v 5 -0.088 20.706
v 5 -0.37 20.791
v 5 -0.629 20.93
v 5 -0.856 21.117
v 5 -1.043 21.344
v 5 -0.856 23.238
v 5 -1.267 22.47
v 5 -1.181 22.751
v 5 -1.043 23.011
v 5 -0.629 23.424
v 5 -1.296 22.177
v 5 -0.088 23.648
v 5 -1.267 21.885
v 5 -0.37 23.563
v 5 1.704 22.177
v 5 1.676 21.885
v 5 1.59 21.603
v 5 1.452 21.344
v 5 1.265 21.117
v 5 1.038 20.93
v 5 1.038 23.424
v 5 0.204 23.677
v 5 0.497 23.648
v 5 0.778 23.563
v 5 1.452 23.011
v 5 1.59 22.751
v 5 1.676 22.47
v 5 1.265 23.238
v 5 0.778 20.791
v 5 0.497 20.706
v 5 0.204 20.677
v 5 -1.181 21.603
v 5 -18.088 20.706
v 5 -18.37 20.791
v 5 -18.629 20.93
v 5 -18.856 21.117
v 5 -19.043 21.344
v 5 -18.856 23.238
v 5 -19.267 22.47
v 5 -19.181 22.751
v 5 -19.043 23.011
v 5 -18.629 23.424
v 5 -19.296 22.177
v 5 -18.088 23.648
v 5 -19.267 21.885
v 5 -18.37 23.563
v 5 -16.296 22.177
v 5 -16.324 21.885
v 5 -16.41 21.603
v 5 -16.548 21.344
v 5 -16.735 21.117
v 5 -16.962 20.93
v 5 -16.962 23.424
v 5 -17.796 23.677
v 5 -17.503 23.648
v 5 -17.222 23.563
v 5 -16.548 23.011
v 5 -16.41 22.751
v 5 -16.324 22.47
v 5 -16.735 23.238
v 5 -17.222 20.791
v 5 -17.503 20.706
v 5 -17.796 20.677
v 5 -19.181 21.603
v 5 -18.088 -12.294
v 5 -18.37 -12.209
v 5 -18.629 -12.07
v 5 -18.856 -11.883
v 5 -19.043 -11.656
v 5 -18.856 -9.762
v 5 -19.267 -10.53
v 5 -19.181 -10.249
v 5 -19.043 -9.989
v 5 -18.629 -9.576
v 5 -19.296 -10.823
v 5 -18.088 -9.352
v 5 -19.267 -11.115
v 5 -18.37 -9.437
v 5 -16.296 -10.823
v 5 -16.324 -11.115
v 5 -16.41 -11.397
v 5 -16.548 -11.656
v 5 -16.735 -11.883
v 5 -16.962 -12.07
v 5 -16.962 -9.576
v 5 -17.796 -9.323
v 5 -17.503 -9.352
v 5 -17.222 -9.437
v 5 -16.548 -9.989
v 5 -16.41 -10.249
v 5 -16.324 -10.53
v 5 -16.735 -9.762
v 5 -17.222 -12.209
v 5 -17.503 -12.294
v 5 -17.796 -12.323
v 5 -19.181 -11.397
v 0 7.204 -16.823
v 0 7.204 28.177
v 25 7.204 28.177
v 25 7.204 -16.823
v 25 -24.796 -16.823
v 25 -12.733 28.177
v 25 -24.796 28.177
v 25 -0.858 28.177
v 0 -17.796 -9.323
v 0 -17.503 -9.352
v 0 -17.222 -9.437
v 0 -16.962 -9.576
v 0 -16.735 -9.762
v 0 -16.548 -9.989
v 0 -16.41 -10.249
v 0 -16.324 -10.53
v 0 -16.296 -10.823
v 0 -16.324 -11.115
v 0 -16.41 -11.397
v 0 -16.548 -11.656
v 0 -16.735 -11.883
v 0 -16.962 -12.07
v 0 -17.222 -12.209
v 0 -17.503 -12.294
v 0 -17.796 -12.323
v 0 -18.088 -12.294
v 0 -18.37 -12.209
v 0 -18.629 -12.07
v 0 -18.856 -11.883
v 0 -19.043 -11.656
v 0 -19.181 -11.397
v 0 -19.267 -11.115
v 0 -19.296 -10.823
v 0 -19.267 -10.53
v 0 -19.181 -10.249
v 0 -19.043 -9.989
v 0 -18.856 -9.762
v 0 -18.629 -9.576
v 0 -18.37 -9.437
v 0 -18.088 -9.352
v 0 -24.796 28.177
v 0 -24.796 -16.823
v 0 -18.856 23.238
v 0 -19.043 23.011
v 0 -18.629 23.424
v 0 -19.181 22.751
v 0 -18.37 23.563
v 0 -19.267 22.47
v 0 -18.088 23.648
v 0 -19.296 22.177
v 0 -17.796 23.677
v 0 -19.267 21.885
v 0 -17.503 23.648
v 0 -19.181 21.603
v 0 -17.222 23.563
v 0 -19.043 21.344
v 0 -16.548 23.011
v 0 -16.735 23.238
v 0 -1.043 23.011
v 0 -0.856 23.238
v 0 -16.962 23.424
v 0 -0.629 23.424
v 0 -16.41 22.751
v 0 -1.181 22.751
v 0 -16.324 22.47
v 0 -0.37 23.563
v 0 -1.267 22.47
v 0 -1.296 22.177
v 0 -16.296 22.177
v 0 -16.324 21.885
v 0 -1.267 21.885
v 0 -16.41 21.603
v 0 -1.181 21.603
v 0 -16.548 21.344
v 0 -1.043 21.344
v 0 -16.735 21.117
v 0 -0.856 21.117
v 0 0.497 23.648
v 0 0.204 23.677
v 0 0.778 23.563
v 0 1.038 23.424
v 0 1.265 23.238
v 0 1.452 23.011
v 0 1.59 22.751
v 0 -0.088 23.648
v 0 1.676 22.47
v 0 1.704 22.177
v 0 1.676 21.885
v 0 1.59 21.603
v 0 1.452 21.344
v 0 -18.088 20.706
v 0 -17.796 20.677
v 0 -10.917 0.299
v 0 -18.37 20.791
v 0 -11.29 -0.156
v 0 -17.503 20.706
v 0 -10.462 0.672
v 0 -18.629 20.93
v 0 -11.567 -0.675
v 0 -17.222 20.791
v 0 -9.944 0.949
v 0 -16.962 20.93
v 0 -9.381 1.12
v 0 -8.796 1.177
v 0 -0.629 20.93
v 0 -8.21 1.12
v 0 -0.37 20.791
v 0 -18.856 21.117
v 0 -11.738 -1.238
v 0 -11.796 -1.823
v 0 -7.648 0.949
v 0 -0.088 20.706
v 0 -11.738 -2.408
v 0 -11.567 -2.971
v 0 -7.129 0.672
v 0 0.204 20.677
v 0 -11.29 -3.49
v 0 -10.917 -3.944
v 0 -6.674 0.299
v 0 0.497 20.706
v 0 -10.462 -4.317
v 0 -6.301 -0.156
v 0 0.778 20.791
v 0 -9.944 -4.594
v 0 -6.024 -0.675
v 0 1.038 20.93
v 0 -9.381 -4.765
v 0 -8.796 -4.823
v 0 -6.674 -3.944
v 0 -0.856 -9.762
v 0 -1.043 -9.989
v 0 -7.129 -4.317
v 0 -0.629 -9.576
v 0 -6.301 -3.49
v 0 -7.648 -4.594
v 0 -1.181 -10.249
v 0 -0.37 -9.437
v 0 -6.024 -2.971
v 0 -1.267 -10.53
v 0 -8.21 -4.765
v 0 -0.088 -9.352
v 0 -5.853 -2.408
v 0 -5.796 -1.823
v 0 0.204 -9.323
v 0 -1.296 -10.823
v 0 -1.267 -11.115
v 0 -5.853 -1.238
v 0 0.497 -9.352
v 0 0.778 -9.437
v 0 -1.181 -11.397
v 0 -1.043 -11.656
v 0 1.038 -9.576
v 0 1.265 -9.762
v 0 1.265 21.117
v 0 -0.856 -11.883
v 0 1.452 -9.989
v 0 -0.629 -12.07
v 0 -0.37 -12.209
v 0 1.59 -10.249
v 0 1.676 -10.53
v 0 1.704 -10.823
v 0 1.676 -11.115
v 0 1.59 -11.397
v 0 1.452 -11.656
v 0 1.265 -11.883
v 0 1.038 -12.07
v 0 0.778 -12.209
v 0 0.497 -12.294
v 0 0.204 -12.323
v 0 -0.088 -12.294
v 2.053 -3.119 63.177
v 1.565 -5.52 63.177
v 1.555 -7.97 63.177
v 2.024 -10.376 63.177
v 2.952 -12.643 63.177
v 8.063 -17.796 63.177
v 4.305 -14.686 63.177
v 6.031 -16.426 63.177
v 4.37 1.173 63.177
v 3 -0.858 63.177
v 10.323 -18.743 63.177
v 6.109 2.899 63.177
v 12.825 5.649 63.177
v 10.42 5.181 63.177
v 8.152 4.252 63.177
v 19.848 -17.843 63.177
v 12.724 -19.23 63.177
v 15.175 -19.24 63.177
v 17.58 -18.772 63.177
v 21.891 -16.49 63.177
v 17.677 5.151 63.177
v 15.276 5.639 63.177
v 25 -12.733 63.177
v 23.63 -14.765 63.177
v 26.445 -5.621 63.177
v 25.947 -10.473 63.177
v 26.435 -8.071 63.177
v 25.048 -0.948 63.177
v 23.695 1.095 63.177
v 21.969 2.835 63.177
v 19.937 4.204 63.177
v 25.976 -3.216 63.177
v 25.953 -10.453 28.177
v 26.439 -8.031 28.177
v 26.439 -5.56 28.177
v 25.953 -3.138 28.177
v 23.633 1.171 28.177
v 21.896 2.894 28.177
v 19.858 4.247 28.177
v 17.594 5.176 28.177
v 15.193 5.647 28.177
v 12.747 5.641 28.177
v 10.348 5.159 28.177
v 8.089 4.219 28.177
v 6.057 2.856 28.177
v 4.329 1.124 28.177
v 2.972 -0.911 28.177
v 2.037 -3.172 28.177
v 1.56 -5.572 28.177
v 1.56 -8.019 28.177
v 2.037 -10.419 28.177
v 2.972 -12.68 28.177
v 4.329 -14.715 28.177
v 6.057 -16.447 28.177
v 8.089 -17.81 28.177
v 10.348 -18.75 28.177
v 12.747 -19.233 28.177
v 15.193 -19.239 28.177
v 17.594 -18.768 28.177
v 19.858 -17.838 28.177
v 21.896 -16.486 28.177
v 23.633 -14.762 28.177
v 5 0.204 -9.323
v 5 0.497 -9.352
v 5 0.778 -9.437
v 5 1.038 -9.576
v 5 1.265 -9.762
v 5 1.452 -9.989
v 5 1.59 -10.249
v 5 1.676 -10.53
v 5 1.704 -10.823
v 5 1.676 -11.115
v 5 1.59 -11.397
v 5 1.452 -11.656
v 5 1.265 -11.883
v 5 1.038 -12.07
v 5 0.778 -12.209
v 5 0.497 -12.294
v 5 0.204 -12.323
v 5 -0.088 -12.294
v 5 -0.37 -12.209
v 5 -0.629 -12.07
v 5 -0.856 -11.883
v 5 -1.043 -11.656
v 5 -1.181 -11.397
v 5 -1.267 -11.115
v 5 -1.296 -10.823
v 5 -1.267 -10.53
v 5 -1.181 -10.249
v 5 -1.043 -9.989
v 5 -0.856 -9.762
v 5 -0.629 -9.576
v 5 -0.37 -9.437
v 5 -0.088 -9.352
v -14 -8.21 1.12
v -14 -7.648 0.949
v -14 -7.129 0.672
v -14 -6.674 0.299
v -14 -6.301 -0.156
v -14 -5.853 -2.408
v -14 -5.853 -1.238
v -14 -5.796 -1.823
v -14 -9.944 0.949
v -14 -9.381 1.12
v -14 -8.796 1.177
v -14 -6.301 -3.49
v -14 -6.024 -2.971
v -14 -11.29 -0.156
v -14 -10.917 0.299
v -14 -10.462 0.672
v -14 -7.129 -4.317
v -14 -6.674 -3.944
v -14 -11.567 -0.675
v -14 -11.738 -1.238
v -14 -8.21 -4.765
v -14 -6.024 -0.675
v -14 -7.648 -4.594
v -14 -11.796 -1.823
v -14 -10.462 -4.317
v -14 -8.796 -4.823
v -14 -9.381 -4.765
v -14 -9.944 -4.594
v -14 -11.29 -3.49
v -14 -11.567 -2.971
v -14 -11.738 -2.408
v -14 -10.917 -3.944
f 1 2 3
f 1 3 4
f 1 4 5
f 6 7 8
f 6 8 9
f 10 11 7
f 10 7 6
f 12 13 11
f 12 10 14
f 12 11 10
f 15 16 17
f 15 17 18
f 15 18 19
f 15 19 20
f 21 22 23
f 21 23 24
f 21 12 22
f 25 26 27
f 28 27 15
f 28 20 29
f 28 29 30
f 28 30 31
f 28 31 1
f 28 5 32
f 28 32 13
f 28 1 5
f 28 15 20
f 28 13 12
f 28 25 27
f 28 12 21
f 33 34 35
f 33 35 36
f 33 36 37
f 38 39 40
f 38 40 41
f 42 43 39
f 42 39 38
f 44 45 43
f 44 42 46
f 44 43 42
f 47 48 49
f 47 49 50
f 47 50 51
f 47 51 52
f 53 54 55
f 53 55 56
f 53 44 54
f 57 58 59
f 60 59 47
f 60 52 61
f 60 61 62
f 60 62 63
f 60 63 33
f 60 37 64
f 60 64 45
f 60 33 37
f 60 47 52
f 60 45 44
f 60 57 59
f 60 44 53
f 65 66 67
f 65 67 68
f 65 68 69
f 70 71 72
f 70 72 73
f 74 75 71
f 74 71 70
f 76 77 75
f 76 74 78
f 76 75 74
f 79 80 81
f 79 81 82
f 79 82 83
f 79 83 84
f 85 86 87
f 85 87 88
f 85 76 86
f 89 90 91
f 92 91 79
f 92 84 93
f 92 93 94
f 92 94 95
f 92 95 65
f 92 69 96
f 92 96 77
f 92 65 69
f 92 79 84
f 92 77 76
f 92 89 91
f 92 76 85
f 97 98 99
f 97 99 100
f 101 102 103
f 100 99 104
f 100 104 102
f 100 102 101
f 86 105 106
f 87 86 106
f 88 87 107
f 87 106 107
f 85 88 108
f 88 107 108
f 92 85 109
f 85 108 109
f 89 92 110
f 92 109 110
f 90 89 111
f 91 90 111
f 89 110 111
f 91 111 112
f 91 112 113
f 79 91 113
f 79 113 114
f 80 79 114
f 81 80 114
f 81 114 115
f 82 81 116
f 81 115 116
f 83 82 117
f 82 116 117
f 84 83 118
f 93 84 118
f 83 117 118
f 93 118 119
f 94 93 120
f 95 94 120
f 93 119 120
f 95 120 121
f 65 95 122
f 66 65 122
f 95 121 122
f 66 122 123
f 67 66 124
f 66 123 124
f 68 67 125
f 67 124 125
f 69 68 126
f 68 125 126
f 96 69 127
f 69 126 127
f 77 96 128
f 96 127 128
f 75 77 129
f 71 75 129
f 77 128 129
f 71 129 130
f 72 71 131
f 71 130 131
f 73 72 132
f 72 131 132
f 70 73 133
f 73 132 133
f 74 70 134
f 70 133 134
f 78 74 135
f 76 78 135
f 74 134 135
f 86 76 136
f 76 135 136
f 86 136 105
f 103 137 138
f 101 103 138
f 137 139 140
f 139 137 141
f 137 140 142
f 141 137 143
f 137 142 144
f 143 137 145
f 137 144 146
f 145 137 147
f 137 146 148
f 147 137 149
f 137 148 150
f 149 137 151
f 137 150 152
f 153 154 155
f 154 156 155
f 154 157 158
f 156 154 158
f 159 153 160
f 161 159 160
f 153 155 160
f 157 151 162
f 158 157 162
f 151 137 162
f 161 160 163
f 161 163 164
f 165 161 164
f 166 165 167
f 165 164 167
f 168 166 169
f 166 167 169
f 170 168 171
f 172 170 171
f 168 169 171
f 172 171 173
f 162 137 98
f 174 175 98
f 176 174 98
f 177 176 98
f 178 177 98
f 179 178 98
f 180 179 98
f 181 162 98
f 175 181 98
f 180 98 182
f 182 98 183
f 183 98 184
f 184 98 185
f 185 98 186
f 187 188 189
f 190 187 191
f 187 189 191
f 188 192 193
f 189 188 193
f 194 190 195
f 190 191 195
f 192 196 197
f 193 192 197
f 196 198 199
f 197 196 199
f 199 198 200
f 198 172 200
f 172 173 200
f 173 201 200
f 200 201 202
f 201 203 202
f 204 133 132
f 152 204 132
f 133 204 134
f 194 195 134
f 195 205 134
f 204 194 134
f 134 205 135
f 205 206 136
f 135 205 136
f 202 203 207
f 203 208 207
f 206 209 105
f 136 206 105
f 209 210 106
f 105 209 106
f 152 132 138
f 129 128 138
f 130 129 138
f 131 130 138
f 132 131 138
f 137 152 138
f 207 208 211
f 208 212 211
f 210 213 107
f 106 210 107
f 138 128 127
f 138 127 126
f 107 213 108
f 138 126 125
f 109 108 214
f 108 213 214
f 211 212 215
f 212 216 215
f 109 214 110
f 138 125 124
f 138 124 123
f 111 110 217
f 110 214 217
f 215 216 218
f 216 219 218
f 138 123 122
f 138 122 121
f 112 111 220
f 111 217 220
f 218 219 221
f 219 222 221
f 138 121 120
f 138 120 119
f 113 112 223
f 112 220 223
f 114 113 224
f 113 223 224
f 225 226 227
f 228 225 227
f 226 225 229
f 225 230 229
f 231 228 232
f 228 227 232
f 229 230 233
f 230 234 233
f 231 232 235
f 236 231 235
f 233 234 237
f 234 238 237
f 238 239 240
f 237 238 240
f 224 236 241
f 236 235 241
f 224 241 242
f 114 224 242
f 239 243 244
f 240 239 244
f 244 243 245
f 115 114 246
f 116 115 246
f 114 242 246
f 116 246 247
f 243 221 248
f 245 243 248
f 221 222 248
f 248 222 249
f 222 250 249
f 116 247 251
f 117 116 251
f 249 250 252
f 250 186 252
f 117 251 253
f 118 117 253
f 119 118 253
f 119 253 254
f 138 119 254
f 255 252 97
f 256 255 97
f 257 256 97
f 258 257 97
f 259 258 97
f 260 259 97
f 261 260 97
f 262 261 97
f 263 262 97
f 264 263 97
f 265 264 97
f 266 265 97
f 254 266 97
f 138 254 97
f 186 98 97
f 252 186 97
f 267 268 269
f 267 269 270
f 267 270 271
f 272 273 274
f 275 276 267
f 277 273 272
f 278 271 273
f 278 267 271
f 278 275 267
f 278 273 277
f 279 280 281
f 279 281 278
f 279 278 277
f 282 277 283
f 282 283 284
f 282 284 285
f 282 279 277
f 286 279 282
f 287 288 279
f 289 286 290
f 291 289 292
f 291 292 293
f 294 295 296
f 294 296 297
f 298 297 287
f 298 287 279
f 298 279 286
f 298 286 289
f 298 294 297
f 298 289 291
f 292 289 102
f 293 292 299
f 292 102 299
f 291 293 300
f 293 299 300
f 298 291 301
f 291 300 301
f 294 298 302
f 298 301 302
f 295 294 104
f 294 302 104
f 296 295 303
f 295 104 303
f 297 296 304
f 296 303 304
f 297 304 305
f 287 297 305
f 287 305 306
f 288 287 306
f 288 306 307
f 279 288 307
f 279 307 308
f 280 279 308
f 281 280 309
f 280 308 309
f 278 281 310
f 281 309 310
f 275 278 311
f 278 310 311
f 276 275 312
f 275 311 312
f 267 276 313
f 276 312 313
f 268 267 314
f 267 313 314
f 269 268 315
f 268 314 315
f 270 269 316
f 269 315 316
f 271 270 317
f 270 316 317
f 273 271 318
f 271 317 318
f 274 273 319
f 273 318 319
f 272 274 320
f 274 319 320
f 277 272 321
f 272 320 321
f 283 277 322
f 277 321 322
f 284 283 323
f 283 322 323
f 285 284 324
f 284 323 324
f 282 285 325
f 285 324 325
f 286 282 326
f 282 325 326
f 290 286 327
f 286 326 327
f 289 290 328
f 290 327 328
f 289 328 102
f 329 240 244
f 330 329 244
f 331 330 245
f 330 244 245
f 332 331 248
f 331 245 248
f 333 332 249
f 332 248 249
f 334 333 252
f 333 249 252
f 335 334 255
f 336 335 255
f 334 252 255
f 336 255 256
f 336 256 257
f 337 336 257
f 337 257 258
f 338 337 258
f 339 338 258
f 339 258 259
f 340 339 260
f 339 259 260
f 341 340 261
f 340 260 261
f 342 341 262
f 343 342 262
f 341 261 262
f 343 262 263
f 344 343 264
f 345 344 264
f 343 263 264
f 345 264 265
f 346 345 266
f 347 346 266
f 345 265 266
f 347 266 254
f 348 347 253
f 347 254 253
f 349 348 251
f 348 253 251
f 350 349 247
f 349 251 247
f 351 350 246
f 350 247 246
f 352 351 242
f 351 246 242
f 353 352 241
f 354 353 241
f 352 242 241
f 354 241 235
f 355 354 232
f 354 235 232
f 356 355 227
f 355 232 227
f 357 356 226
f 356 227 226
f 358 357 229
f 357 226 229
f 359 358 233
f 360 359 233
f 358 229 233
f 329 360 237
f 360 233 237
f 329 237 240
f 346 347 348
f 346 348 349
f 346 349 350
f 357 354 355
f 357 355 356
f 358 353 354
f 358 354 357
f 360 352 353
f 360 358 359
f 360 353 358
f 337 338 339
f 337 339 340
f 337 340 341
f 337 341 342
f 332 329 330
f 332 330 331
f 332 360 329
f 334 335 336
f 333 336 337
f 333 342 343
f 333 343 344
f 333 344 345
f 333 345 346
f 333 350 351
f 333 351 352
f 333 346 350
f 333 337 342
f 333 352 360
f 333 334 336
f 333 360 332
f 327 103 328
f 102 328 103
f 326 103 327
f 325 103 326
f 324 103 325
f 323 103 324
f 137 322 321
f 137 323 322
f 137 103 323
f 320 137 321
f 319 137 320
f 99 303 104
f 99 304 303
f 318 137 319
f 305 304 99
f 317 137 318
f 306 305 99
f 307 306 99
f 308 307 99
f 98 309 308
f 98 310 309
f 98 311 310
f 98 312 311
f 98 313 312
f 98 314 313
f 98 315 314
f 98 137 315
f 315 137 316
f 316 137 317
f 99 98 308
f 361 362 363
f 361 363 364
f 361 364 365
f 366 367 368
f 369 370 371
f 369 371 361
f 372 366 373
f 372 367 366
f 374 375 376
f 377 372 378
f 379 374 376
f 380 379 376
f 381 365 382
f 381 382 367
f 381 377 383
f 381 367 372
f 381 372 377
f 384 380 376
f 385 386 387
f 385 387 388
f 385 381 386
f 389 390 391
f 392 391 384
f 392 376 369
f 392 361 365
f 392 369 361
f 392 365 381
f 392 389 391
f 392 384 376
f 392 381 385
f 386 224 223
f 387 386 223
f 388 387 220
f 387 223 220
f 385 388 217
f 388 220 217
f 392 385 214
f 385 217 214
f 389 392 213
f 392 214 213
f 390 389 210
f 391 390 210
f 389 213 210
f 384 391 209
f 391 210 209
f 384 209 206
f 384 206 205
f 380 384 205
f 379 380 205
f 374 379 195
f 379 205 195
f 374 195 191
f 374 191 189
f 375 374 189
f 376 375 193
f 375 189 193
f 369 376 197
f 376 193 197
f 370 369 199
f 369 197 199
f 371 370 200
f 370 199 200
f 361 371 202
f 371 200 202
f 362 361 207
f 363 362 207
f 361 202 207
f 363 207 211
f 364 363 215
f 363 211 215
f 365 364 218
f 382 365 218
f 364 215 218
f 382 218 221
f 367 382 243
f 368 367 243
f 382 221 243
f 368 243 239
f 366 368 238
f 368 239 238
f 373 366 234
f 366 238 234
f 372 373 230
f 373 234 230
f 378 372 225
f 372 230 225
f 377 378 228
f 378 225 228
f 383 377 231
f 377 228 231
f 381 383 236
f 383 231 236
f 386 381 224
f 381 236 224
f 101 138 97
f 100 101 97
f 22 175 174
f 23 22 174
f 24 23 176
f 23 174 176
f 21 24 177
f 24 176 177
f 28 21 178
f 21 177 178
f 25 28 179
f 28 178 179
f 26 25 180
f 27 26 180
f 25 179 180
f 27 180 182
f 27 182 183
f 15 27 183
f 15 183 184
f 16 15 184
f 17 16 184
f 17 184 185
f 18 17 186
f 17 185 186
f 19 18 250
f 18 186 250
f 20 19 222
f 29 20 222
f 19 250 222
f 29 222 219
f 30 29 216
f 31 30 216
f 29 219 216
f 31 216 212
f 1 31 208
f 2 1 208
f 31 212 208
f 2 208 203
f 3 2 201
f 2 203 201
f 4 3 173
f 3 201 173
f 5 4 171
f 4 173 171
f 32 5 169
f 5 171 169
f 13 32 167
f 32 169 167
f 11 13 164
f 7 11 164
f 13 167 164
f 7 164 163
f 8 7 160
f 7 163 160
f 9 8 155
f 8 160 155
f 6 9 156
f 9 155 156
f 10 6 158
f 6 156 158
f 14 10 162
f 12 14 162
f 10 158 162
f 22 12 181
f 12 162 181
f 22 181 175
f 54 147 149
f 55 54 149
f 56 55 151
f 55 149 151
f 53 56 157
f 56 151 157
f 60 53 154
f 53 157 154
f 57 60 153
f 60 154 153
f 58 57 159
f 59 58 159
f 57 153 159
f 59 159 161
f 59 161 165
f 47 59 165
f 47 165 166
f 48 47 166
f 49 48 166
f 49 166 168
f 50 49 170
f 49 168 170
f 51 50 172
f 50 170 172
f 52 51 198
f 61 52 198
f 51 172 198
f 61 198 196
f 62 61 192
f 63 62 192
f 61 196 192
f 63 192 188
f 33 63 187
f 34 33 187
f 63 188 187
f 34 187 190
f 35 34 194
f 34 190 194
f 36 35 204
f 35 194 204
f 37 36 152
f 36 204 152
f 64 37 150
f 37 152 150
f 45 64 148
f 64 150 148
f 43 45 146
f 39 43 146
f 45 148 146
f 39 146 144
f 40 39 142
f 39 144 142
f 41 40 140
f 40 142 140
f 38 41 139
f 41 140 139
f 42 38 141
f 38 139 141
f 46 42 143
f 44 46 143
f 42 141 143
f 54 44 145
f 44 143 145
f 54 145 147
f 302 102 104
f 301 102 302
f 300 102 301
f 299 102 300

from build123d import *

# Parameters (mm, degrees)
SKETCH1_W           = 45
SKETCH1_H           = 32
BOSS_EXTRUDE1_DEPTH = 25
SKETCH2_R           = 12.5
BOSS_EXTRUDE2_DEPTH = 35
SKETCH3_R           = 3
BOSS_EXTRUDE3_DEPTH = 14
SKETCH4_R           = 1.5
CUT_EXTRUDE1_DEPTH  = 5


with BuildPart() as part:
    # Sketch1 → Boss-Extrude1 (new body)
    with BuildSketch(Plane(origin=(0, 0, 0), x_dir=(0, 0, -1), z_dir=(1, 0, 0))):
        with Locations((-5.67718197, -8.795606883)):
            Rectangle(SKETCH1_W, SKETCH1_H)
    extrude(amount=BOSS_EXTRUDE1_DEPTH)

    # Sketch2 → Boss-Extrude2 (add)
    with BuildSketch(Plane.XY.offset(28.17718197)):
        with Locations(Location((14, -6.795606883, 0), (0, 0, 331.642363424))):
            Circle(SKETCH2_R)
    extrude(amount=BOSS_EXTRUDE2_DEPTH)

    # Sketch3 → Boss-Extrude3 (add)
    with BuildSketch(Plane.ZY):
        with Locations(Location((-1.82281803, -8.795606883, 0), (0, 0, 180))):
            Circle(SKETCH3_R)
    extrude(amount=BOSS_EXTRUDE3_DEPTH)

    # Sketch4 → Cut-Extrude1 (cut)
    with BuildSketch(Plane.ZY):
        with Locations((-10.82281803, 0.204393117)):
            Circle(SKETCH4_R)
        with Locations((22.17718197, 0.204393117)):
            Circle(SKETCH4_R)
        with Locations((22.17718197, -17.795606883)):
            Circle(SKETCH4_R)
        with Locations((-10.82281803, -17.795606883)):
            Circle(SKETCH4_R)
    extrude(amount=-CUT_EXTRUDE1_DEPTH, mode=Mode.SUBTRACT)


solid = part.part
